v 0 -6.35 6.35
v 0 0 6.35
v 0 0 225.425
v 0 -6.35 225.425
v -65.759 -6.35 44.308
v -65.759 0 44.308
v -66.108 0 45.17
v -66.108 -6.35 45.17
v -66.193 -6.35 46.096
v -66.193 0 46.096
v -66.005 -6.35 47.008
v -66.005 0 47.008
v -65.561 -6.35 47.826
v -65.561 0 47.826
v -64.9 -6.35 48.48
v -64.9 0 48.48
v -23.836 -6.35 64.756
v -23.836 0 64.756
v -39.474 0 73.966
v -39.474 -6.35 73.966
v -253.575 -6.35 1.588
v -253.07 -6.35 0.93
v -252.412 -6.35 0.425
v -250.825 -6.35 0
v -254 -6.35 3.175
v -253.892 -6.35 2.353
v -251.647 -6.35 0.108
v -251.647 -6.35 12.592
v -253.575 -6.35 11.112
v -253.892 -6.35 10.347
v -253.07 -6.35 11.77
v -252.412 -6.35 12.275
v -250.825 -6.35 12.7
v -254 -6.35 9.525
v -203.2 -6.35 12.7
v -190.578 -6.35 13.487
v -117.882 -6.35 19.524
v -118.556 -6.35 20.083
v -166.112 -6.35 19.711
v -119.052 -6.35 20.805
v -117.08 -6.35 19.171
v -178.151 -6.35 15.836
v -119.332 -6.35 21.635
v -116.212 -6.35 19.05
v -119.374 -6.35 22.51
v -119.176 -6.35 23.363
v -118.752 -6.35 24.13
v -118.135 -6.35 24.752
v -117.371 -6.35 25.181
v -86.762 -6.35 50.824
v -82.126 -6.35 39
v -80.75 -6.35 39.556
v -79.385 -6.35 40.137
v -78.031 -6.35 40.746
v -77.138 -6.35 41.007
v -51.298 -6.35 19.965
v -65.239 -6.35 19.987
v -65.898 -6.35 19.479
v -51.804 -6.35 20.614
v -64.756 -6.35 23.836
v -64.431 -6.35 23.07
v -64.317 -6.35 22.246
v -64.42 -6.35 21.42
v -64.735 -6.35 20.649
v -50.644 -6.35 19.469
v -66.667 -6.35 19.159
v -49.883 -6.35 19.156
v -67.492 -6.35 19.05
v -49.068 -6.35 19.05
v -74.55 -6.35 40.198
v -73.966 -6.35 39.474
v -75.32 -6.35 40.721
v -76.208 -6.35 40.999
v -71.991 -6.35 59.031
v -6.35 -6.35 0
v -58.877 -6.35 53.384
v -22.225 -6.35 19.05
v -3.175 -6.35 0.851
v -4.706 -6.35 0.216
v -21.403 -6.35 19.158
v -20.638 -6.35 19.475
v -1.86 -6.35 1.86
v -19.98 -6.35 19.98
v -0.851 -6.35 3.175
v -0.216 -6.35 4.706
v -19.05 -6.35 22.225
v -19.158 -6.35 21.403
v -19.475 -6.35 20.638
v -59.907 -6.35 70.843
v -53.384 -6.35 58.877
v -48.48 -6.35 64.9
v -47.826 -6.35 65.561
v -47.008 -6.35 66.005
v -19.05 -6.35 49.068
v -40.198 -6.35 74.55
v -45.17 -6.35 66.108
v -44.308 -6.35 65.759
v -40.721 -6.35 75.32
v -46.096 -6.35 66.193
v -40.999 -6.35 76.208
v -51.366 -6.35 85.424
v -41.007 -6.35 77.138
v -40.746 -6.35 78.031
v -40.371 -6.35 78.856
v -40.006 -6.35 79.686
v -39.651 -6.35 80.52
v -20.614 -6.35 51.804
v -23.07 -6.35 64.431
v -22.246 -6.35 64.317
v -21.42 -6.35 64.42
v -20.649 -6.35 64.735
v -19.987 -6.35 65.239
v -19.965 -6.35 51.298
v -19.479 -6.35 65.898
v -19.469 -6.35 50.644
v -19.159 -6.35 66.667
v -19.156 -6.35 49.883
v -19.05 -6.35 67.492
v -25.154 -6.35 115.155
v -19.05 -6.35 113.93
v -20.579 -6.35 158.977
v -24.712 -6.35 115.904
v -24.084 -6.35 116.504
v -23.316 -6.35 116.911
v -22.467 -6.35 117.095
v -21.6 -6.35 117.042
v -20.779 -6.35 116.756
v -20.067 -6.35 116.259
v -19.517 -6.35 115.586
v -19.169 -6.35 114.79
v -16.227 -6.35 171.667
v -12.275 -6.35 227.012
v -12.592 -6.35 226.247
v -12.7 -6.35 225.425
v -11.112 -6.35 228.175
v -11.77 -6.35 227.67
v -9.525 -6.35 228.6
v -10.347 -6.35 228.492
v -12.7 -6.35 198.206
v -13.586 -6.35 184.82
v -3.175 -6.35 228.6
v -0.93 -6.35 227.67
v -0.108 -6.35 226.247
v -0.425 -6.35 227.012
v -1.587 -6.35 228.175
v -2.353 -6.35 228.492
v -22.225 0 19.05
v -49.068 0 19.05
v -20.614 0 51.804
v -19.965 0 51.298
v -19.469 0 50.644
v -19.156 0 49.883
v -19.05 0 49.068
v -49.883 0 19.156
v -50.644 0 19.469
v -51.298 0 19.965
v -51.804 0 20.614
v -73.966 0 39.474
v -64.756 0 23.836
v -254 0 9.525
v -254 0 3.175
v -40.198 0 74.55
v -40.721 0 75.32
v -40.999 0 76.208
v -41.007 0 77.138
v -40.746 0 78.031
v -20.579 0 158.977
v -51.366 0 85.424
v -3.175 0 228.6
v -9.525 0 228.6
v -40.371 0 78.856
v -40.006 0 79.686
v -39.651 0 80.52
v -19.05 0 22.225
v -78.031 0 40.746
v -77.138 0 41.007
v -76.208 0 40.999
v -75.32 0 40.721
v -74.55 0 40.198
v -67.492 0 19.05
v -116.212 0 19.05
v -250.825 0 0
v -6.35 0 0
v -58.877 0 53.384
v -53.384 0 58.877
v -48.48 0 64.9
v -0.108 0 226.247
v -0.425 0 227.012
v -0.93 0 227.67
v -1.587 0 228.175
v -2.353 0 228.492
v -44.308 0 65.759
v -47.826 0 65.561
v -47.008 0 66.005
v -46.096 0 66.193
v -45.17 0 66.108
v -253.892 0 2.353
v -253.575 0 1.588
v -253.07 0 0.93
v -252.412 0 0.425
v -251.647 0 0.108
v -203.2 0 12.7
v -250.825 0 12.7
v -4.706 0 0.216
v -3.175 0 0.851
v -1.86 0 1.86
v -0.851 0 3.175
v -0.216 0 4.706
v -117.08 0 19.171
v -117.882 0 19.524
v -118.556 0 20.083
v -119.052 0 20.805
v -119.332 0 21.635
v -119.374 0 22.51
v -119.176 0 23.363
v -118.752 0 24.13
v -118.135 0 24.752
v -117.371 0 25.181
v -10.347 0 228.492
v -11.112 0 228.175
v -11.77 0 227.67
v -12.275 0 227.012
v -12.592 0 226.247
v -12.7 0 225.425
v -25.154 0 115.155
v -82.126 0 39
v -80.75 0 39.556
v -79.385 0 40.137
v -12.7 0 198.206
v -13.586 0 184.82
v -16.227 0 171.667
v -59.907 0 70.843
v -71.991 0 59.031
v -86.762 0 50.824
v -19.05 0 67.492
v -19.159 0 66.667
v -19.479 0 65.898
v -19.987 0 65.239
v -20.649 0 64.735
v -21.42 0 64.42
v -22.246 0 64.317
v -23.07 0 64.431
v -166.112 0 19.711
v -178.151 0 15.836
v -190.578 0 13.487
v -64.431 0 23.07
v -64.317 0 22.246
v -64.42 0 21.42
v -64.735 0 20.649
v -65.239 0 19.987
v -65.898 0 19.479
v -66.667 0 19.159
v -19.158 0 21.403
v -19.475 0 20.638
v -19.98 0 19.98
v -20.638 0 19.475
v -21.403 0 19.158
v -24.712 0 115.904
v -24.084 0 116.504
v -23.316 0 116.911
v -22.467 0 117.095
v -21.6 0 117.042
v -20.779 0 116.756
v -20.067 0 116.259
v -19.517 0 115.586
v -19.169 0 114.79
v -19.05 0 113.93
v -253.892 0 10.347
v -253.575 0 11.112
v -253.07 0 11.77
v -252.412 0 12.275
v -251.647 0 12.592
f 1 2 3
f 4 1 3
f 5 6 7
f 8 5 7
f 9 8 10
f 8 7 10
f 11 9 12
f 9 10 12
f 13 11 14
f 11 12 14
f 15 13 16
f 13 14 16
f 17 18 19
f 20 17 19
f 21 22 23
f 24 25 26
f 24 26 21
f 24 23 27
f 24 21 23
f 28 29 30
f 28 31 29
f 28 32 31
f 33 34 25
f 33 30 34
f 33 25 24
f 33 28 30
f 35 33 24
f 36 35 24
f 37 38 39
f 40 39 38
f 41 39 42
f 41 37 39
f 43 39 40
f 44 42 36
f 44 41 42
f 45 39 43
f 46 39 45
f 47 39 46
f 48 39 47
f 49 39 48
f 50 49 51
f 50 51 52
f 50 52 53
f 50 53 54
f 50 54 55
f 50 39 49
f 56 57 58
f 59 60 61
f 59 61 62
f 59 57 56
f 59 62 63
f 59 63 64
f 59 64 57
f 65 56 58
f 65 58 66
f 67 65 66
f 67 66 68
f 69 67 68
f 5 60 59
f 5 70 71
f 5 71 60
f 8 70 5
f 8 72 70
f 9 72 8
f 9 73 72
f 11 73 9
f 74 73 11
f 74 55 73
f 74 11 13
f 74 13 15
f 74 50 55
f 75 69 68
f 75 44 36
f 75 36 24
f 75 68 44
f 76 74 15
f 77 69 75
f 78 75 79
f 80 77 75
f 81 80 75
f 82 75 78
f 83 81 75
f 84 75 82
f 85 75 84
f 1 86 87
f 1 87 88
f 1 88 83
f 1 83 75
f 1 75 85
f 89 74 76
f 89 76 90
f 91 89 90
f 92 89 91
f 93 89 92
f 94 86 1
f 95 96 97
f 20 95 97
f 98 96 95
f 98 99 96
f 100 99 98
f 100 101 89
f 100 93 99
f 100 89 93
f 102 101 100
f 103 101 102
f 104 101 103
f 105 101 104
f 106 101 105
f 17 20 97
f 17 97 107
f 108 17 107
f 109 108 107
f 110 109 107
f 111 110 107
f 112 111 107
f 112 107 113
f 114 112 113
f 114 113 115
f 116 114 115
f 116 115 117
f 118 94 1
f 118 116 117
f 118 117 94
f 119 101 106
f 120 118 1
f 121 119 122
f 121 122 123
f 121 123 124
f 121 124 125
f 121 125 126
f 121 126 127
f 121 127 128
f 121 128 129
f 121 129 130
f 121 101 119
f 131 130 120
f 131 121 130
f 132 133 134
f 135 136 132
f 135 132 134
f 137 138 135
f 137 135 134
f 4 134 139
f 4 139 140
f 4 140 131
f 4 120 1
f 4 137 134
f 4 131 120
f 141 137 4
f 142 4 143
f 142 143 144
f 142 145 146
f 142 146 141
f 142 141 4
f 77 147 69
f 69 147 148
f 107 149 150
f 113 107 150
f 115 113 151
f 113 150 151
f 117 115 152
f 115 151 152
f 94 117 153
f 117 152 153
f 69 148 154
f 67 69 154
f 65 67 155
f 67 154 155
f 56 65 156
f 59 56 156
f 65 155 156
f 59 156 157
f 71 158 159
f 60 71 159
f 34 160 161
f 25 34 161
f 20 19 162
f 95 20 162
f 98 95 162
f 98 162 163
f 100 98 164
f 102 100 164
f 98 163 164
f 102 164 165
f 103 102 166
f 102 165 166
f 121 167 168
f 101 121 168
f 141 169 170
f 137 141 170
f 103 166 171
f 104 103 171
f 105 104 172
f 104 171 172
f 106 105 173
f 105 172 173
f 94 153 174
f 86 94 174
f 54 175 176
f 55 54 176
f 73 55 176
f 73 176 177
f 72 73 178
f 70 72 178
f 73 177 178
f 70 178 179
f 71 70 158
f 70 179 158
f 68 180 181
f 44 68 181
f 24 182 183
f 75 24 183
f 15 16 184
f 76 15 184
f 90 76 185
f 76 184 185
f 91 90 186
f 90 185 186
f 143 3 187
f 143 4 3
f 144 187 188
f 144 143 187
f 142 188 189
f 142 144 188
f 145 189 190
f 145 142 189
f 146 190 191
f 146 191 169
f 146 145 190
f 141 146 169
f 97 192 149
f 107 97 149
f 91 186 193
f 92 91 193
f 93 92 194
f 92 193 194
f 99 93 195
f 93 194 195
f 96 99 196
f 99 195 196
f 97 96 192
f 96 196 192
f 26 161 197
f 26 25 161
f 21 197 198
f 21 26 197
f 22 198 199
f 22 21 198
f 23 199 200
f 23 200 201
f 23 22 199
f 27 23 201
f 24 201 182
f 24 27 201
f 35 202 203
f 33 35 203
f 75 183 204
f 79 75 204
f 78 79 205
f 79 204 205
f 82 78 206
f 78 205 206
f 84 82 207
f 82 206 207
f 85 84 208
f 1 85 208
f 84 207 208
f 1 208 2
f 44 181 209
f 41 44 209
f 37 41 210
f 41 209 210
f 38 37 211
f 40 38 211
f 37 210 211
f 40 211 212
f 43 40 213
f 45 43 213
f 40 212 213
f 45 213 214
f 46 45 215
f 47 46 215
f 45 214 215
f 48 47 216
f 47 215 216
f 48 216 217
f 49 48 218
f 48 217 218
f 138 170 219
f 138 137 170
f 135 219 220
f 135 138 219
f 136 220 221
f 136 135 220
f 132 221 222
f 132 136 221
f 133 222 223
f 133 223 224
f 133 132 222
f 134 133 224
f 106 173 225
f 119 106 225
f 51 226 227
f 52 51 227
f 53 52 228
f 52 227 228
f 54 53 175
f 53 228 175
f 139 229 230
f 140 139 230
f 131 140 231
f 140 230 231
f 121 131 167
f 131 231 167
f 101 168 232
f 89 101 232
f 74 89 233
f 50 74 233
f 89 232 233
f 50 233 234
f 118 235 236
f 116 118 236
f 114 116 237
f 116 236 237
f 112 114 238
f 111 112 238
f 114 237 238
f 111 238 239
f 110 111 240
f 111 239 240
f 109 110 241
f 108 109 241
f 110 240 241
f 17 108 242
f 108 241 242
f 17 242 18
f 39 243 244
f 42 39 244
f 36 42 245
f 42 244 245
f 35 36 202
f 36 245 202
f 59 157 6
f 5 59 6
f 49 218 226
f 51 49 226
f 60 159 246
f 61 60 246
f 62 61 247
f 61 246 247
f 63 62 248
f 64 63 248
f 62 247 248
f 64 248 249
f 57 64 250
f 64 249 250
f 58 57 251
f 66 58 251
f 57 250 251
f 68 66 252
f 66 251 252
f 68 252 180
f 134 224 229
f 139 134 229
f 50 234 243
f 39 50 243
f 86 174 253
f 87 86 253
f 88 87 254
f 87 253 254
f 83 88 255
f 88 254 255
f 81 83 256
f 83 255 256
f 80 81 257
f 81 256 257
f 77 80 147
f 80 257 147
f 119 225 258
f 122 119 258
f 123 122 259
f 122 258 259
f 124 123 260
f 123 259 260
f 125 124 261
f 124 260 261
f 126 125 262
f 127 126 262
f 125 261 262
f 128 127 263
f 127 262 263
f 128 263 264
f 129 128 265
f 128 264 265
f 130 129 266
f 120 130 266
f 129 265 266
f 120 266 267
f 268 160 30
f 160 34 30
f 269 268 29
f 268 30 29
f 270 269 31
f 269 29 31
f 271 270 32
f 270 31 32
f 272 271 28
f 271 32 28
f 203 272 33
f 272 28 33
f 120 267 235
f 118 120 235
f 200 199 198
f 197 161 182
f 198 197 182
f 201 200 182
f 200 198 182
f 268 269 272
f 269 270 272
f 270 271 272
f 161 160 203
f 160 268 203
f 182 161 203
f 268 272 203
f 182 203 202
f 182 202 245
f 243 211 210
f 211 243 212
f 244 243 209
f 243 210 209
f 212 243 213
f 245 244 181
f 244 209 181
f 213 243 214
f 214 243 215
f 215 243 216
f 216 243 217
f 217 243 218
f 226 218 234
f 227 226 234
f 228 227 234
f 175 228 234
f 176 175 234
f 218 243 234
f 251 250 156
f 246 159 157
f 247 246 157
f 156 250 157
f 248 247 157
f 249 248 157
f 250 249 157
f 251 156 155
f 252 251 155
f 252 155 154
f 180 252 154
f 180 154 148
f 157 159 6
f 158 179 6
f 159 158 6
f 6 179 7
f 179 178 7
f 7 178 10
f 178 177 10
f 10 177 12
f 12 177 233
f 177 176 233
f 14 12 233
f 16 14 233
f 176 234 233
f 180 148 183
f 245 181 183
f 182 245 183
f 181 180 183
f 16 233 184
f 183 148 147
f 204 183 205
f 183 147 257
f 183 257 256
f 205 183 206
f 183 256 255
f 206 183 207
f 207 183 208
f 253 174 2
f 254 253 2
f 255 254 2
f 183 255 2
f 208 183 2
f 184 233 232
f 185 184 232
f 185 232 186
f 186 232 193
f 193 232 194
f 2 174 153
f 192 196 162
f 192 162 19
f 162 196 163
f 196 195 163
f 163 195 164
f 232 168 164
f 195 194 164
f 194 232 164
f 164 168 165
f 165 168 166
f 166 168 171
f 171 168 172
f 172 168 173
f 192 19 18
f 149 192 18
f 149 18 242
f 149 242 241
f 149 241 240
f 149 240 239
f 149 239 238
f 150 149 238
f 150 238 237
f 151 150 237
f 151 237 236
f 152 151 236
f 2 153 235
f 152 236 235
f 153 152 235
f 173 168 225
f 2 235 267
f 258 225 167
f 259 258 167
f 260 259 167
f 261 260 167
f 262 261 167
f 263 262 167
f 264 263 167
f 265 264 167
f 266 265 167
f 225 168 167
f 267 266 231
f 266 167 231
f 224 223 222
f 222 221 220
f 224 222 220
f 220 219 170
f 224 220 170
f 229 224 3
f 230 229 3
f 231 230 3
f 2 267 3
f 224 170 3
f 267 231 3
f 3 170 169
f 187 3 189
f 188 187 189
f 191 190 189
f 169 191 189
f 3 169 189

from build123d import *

# Parameters (mm, degrees)
F1_DEPTH = 6.35
F2_R     = 3.175


with BuildPart() as f1:
    # F0 (on Front) → F1 (new body)
    with BuildSketch(Plane.XZ):
        with BuildLine():
            Line((-254, 12.7), (-254, 0))
            Line((-254, 0), (-6.35, 0))
            ThreePointArc((-6.35, 0), (-1.859872, 1.859872), (0, 6.35))
            Line((0, 6.35), (0, 228.6))
            Line((0, 228.6), (-12.7, 228.6))
            Line((-12.7, 228.6), (-12.7, 198.205883))
            ThreePointArc((-12.7, 198.205883), (-14.689229, 178.199527), (-20.579021, 158.976581))
            Line((-20.579021, 158.976581), (-51.366437, 85.423735))
            ThreePointArc((-51.366437, 85.423735), (-65.554229, 64.533113), (-86.762078, 50.82404))
            Line((-86.762078, 50.82404), (-166.112046, 19.711186))
            ThreePointArc((-166.112046, 19.711186), (-184.327579, 14.468183), (-203.2, 12.7))
            Line((-203.2, 12.7), (-254, 12.7))
        make_face()
        with BuildLine():
            Line((-117.371321, 25.1809), (-82.126084, 39.000439))
            ThreePointArc((-82.126084, 39.000439), (-80.06592, 39.843141), (-78.031249, 40.745656))
            ThreePointArc((-78.031249, 40.745656), (-75.753604, 40.892633), (-73.965863, 39.473743))
            Line((-73.965863, 39.473743), (-64.755951, 23.83627))
            ThreePointArc((-64.755951, 23.83627), (-64.735236, 20.64943), (-67.49172, 19.05))
            Line((-67.49172, 19.05), (-116.212322, 19.05))
            ThreePointArc((-116.212322, 19.05), (-119.332067, 21.635237), (-117.371321, 25.1809))
        make_face(mode=Mode.SUBTRACT)
        with BuildLine():
            Line((-51.80374, 20.61373), (-65.758555, 44.307554))
            ThreePointArc((-65.758555, 44.307554), (-66.132559, 46.559084), (-64.899556, 48.479753))
            ThreePointArc((-64.899556, 48.479753), (-56.060512, 56.060512), (-48.479753, 64.899556))
            ThreePointArc((-48.479753, 64.899556), (-46.559084, 66.132559), (-44.307554, 65.758555))
            Line((-44.307554, 65.758555), (-20.61373, 51.80374))
            ThreePointArc((-20.61373, 51.80374), (-19.468516, 50.643541), (-19.05, 49.067971))
            Line((-19.05, 49.067971), (-19.05, 22.225))
            ThreePointArc((-19.05, 22.225), (-19.979936, 19.979936), (-22.225, 19.05))
            Line((-22.225, 19.05), (-49.067971, 19.05))
            ThreePointArc((-49.067971, 19.05), (-50.643541, 19.468516), (-51.80374, 20.61373))
        make_face(mode=Mode.SUBTRACT)
        with BuildLine():
            Line((-39.651315, 80.520073), (-25.153781, 115.155487))
            ThreePointArc((-25.153781, 115.155487), (-21.599801, 117.042408), (-19.05, 113.929571))
            Line((-19.05, 113.929571), (-19.05, 67.49172))
            ThreePointArc((-19.05, 67.49172), (-20.64943, 64.735236), (-23.83627, 64.755951))
            Line((-23.83627, 64.755951), (-39.473743, 73.965863))
            ThreePointArc((-39.473743, 73.965863), (-40.892633, 75.753604), (-40.745656, 78.031249))
            ThreePointArc((-40.745656, 78.031249), (-40.187384, 79.27078), (-39.651315, 80.520073))
        make_face(mode=Mode.SUBTRACT)
    extrude(amount=F1_DEPTH)

    # F2
    f2_edges = [f1.edges().sort_by_distance(p)[0] for p in [
        (-254, -3.175, 0),
        (-254, -3.175, 12.7),
        (0, -3.175, 228.6),
        (-12.7, -3.175, 228.6),
    ]]
    fillet(f2_edges, radius=F2_R)


solid = f1.part
